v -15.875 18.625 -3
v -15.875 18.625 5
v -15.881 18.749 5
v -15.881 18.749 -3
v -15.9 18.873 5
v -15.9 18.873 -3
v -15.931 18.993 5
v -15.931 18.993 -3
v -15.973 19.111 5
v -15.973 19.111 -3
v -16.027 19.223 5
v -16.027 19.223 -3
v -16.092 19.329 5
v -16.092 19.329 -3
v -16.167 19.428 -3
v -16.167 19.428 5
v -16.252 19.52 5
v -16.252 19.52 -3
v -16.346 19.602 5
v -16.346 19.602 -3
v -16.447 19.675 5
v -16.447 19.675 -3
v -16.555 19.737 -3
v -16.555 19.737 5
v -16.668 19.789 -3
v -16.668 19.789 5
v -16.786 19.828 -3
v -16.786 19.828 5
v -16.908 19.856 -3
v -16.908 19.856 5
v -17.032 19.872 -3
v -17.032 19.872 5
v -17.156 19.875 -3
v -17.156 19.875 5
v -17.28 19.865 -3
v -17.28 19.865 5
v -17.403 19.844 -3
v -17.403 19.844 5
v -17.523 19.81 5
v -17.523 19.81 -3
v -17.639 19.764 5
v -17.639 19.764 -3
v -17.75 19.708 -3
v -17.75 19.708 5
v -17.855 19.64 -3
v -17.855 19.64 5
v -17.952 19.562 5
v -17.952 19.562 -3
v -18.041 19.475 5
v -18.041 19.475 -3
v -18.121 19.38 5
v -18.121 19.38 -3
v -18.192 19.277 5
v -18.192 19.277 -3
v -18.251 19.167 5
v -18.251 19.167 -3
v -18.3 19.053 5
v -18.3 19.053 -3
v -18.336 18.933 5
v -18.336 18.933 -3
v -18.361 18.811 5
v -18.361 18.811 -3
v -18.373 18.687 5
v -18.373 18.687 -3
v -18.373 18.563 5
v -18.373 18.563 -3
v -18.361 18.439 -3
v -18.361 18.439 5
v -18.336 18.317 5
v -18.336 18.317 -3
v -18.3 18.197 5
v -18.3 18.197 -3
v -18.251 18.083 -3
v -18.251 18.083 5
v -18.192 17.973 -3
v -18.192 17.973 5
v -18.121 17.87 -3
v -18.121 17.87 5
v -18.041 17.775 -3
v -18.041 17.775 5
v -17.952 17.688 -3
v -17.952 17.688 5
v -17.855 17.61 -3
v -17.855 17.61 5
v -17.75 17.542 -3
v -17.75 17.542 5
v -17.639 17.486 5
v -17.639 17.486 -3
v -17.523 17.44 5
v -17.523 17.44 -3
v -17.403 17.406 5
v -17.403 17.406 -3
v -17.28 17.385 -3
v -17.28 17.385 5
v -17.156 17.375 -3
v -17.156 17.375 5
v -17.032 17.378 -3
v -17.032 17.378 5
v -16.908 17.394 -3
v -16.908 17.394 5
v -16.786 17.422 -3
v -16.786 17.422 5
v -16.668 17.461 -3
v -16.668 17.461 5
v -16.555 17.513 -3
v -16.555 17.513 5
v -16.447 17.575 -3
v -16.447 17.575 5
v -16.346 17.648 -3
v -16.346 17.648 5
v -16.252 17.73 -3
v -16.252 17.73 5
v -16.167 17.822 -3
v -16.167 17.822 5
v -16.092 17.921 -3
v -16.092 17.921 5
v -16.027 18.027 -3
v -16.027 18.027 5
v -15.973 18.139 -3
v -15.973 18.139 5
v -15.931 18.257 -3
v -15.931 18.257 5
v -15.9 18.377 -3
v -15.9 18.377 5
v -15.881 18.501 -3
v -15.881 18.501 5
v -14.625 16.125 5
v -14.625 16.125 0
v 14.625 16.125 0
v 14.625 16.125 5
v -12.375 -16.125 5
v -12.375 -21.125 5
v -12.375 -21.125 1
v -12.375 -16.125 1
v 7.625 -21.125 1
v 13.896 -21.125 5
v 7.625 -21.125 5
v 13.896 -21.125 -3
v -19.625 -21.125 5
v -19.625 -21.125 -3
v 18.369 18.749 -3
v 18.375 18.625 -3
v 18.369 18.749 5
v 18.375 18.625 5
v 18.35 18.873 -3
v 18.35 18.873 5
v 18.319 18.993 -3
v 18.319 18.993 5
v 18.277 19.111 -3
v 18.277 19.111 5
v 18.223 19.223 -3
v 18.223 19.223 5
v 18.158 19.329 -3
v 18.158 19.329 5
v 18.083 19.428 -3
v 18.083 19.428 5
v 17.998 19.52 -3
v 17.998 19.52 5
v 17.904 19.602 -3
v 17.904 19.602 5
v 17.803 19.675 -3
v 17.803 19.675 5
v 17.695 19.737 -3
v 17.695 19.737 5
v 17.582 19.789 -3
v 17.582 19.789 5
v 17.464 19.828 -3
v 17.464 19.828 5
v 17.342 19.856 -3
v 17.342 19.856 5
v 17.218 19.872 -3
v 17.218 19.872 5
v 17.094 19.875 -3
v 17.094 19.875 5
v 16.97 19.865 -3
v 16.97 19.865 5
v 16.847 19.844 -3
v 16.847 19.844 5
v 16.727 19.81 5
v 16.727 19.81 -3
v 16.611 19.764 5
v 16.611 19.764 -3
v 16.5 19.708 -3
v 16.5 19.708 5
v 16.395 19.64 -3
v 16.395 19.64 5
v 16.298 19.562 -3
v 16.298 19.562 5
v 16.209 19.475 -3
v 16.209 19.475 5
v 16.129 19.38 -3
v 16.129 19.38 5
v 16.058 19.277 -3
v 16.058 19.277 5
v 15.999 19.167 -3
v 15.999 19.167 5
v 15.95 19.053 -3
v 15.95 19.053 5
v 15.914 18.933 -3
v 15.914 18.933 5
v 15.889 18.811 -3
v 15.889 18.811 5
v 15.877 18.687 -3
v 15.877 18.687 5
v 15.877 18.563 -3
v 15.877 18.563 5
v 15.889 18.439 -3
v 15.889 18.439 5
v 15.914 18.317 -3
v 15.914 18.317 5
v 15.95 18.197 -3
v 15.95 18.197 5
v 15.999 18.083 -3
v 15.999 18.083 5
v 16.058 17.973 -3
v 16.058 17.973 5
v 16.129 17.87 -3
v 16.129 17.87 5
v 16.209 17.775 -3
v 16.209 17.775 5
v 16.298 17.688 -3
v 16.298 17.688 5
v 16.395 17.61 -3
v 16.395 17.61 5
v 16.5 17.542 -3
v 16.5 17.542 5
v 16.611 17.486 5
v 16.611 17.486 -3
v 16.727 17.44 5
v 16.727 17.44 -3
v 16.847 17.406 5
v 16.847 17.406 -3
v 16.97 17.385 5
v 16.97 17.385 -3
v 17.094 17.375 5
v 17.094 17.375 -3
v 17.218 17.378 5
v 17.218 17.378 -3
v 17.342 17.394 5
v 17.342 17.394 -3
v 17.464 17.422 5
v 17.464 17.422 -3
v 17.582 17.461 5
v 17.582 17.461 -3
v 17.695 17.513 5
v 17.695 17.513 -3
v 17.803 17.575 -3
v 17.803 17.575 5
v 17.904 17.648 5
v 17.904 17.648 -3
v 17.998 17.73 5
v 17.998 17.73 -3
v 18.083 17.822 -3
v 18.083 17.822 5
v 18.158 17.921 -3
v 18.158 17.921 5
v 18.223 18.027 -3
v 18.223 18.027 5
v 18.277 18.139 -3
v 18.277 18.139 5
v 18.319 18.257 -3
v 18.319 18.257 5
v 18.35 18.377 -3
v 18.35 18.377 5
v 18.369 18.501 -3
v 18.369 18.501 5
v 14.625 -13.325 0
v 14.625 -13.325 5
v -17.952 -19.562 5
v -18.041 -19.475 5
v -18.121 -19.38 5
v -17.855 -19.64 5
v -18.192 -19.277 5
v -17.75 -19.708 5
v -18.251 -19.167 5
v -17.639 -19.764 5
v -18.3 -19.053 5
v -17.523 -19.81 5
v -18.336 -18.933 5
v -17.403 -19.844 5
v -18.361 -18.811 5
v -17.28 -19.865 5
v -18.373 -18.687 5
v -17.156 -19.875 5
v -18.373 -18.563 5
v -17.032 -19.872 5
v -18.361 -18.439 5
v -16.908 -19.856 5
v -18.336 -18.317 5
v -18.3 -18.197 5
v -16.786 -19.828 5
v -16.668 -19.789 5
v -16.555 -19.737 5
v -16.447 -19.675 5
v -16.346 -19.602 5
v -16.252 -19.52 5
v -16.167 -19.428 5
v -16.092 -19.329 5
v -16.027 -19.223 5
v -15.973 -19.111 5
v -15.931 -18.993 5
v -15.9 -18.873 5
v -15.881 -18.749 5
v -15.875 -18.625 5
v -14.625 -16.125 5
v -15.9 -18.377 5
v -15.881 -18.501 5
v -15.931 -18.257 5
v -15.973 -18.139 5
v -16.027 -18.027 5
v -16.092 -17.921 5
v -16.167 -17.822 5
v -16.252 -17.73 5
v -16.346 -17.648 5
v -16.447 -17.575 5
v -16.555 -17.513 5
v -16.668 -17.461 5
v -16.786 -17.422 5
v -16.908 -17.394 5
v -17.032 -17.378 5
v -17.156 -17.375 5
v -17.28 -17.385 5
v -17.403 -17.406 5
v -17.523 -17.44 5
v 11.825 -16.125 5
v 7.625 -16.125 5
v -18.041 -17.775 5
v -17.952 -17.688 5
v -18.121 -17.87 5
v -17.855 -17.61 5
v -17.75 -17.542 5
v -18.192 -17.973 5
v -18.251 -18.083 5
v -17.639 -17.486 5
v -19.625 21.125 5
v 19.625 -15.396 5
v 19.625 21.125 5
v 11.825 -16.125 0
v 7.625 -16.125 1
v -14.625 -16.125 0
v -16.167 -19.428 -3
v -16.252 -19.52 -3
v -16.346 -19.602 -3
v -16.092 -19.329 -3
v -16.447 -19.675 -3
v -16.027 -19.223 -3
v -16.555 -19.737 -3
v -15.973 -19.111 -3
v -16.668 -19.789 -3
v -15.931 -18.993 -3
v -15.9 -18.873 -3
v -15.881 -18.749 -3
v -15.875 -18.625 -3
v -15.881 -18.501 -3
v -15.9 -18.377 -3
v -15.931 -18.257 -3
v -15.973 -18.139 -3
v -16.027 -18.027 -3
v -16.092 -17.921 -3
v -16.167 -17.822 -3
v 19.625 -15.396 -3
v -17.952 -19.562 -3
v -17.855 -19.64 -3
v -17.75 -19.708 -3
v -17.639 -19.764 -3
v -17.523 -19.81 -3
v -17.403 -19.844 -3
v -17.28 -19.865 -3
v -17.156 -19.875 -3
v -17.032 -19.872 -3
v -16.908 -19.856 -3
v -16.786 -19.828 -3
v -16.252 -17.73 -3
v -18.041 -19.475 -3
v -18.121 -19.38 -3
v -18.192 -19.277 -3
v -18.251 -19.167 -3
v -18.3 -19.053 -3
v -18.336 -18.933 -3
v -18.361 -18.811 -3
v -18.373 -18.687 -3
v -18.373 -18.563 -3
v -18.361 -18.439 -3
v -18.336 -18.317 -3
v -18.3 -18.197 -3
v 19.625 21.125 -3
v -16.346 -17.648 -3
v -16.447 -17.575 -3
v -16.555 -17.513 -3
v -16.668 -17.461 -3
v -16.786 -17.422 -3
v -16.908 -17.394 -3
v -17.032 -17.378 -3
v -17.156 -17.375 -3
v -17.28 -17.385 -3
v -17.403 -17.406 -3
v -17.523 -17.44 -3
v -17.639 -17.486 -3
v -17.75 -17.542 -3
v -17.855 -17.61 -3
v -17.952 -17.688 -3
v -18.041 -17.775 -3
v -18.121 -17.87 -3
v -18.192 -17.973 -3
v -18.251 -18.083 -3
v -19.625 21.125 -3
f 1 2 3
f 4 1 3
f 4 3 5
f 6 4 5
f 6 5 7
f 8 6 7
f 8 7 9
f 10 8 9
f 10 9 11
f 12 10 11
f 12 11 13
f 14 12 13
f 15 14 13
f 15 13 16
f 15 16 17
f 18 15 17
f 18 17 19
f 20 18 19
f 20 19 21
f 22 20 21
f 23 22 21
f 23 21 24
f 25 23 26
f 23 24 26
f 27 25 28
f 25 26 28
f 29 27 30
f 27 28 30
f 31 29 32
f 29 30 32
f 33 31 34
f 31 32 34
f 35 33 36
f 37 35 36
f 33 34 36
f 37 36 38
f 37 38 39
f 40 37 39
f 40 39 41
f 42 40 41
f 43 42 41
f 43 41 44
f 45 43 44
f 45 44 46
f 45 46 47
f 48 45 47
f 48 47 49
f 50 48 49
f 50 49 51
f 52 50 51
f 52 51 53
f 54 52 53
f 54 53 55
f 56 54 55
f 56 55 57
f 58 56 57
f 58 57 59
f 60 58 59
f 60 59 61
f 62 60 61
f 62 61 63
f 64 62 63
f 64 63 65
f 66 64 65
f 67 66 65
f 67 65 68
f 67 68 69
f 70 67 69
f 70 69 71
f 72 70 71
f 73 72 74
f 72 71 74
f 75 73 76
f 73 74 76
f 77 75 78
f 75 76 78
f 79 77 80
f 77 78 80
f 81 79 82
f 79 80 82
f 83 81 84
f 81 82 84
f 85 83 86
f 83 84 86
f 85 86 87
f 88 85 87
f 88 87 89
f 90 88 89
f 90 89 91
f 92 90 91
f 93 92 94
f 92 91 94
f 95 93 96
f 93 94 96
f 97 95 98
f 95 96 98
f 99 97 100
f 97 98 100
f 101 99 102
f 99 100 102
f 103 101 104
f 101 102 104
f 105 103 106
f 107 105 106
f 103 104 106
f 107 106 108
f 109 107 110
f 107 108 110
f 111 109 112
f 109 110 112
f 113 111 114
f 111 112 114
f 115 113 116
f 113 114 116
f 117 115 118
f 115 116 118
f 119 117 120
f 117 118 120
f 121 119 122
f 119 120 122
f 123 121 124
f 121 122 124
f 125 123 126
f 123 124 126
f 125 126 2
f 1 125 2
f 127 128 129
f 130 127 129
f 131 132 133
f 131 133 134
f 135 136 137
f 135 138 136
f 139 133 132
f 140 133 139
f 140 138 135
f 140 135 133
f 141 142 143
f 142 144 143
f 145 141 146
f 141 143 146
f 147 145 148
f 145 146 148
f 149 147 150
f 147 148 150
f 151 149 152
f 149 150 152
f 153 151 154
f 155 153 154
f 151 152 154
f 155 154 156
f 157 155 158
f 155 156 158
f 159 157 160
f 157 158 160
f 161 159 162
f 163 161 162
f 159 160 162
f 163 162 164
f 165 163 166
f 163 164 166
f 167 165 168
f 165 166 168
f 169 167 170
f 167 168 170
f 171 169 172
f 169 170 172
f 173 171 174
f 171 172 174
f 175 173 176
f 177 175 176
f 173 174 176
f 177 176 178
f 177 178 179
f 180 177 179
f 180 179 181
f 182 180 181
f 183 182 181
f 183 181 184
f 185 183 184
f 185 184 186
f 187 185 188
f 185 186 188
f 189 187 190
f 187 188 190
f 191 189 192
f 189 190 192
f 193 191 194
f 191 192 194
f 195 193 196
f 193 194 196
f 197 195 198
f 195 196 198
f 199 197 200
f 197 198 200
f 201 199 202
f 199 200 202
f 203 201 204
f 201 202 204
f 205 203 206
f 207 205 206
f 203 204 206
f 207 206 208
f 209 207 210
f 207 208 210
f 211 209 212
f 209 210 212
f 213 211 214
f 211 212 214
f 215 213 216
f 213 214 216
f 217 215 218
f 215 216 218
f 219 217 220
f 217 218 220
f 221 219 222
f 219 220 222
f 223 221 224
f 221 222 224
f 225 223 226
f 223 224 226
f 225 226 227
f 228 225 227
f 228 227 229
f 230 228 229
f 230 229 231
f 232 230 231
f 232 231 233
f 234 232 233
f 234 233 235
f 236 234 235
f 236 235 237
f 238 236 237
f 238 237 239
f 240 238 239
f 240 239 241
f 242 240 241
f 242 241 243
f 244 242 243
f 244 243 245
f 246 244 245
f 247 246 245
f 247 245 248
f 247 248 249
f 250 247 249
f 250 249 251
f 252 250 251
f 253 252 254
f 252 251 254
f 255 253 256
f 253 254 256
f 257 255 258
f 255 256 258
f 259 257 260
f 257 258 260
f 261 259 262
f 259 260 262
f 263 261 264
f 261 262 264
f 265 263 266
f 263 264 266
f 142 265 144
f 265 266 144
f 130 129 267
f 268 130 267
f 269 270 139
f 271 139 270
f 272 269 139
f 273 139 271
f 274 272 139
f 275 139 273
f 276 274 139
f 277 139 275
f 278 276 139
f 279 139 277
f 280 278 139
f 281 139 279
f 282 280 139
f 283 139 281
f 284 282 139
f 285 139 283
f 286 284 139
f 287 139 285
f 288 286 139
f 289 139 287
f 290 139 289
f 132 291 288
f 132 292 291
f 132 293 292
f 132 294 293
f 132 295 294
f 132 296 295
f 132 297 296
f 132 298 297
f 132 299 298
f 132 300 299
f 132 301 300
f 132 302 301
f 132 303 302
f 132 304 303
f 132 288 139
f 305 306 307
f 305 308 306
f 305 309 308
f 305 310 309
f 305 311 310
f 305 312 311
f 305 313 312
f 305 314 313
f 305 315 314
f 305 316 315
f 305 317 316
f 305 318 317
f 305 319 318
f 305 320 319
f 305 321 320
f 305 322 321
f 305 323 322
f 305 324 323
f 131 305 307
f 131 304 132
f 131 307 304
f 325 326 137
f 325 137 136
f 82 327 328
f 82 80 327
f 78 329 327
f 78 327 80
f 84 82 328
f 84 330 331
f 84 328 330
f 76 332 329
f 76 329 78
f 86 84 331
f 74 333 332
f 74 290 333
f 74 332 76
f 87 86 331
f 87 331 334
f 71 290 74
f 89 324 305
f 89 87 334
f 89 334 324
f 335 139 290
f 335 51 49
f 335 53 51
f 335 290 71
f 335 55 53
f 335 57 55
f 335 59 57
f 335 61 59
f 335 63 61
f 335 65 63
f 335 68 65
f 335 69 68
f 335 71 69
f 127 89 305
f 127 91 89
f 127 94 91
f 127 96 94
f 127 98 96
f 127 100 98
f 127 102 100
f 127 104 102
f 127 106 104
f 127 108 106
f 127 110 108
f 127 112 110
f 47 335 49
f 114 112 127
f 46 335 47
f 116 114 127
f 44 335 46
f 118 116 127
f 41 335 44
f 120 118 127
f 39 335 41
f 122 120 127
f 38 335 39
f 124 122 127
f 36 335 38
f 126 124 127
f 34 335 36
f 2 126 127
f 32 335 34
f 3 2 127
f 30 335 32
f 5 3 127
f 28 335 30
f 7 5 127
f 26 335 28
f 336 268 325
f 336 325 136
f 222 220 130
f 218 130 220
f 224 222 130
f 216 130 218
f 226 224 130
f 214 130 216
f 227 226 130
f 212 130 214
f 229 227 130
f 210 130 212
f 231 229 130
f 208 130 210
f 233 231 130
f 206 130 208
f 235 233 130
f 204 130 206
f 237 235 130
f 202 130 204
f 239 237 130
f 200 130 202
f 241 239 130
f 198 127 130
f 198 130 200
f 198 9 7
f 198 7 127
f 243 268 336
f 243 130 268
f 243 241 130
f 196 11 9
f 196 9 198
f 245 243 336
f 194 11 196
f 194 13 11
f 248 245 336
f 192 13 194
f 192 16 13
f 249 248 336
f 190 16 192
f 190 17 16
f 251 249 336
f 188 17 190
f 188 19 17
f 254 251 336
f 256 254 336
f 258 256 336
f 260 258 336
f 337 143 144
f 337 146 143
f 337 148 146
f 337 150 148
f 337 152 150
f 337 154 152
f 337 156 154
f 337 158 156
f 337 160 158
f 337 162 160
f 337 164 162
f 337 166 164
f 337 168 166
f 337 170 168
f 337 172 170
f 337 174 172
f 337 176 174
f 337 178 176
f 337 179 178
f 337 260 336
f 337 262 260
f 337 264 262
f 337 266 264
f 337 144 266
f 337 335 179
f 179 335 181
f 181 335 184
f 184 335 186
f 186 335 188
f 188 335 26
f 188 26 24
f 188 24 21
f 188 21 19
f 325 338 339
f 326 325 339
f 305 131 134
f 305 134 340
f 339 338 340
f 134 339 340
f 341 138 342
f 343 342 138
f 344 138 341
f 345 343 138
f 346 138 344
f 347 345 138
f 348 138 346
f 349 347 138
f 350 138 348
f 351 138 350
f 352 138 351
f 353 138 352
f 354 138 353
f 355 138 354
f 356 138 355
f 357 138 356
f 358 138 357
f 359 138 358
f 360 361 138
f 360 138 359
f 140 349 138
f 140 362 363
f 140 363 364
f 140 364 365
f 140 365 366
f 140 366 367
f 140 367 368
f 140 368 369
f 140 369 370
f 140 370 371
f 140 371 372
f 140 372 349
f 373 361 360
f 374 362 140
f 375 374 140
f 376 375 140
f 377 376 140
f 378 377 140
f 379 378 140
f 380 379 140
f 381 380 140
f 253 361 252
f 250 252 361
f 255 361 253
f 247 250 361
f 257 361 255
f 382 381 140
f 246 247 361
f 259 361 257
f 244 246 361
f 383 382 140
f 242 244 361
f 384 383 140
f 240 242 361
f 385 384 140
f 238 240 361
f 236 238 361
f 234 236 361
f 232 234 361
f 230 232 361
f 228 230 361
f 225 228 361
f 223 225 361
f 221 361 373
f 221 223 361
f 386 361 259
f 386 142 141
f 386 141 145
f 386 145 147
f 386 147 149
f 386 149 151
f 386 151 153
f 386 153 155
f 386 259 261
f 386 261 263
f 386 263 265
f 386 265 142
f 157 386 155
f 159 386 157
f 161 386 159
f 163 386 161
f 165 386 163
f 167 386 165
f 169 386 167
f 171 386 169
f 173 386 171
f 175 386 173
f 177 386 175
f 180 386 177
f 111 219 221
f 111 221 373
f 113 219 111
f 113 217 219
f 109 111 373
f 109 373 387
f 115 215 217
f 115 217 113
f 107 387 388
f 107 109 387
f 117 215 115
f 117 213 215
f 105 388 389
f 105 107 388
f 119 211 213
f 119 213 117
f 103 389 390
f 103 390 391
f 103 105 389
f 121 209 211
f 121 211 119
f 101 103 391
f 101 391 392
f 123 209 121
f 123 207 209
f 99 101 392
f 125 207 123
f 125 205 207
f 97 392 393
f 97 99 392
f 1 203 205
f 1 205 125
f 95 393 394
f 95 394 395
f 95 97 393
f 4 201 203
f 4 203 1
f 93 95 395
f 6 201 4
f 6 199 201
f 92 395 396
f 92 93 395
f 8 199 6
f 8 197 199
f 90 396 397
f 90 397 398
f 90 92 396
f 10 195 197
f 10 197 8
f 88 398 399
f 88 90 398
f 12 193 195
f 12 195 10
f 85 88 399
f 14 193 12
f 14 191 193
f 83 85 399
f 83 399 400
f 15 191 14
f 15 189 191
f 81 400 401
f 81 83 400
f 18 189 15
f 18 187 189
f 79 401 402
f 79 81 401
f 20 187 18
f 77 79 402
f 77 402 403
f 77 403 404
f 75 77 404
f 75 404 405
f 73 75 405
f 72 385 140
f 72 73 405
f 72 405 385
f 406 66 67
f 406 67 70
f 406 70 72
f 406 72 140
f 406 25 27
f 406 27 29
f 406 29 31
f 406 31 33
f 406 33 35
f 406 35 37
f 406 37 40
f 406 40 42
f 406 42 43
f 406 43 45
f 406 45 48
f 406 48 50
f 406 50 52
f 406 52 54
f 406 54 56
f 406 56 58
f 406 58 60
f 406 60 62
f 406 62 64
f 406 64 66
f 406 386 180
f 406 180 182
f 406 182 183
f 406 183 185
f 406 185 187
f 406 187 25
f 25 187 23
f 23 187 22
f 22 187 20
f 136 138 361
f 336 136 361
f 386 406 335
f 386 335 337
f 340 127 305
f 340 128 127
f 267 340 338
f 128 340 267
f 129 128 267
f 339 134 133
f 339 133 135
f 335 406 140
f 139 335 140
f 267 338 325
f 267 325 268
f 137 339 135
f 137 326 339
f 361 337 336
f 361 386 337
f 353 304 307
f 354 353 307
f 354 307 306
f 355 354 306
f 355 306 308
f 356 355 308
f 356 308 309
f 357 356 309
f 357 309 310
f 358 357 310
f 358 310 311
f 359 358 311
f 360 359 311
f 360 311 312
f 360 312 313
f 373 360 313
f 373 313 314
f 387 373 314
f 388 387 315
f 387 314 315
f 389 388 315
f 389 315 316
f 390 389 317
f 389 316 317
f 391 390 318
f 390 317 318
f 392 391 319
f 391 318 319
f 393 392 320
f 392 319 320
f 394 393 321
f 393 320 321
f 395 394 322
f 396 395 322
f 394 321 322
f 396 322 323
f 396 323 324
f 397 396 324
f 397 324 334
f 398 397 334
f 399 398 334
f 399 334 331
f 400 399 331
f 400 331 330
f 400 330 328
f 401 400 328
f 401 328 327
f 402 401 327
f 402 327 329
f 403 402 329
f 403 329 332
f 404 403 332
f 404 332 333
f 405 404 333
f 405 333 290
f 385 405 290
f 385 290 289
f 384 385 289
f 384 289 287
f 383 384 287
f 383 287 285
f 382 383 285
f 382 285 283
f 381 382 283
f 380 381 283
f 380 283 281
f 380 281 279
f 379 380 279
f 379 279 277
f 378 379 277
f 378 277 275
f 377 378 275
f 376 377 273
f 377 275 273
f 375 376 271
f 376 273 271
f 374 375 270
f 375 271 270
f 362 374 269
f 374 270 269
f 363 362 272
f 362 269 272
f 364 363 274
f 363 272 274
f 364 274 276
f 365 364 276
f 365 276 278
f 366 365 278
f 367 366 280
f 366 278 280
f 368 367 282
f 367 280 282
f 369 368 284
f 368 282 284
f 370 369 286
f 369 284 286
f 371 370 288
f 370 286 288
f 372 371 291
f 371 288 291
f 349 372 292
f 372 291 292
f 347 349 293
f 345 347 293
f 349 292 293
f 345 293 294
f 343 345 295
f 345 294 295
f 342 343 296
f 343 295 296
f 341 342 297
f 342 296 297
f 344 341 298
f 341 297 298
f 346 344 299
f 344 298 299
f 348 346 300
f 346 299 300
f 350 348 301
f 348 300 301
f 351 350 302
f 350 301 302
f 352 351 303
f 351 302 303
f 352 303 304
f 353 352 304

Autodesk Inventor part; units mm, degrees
ref_plane "YZ Plane" through (0, 0, 0) normal (1, 0, 0) x (0, 1, 0)
ref_plane "XZ Plane" through (0, 0, 0) normal (0, 1, 0) x (-1, 0, 0)
ref_plane "XY Plane" through (0, 0, 0) normal (0, 0, 1) x (1, 0, 0)
sketch "Sketch1" plane through (0, 0, 0) normal (0, 0, 1) x (1, 0, 0)
  line L0 (11.825, -16.125) -> (-11.825, -16.125)
  line L1 (-14.625, -13.325) -> (-14.625, 16.125)
  line L2 (-14.625, 16.125) -> (14.625, 16.125)
  line L3 (14.625, 16.125) -> (14.625, -13.325)
  line L4 (14.625, -16.125) -> (-14.625, 16.125) construction
  line L5 (-14.625, -16.125) -> (14.625, 16.125) construction
  line L6 (11.825, -16.125) -> (14.625, -13.325)
  line L7 (-14.625, -13.325) -> (-14.625, -16.125)
  line L8 (-14.625, -16.125) -> (-11.825, -16.125)
  point P0 (0, 0)
  dimension "d0" = 29.25
  dimension "d1" = 32.25
  dimension "d24" = 2.8
  dimension "d25" = 2.8
extrude "Extrusion1" add sketch "Sketch1" along normal blind 5
shell "Shell2" thickness 5 outward yes removed faces 1 at (-4.875, -3.5083, 5)
sketch "Sketch3" plane through (0, 0, 5) normal (0, 0, 1) x (1, 0, 0)
  line L0 (19.625, 21.125) -> (-19.625, 21.125) construction
  line L1 (-14.625, 16.125) -> (14.625, 16.125) construction
  line L2 (-19.625, 21.125) -> (-14.625, 16.125) construction
  line L3 (19.625, -15.3961) -> (19.625, 21.125) construction
  line L4 (14.625, 16.125) -> (19.625, 21.125) construction
  line L5 (11.825, -16.125) -> (-14.625, -16.125) construction
  circle A0 centre (-17.125, 18.625) radius 1.25
  circle A1 centre (17.125, 18.625) radius 1.25
  line L6 (-14.625, -16.125) -> (11.825, -16.125) construction
  line L7 (-19.625, 21.125) -> (-19.625, -21.125) construction
  line L8 (-14.625, -16.125) -> (-19.625, -21.125) construction
  circle A2 centre (-17.125, -18.625) radius 1.25
  point P0 (0, 0)
  point P1 (-11.825, -16.125)
  dimension "d14" = 2.5
  dimension "d15" = 2.5
  dimension "d26" = 2.5
extrude "Extrusion3" cut sketch "Sketch3" against normal through all
sketch "Sketch4" plane through (0, 0, 5) normal (0, 0, 1) x (1, 0, 0)
  line L0 (-19.625, -21.125) -> (13.8961, -21.125) projected
  line L1 (11.825, -16.125) -> (-14.625, -16.125) projected
  line L2 (7.625, -21.125) -> (-12.375, -21.125)
  line L3 (-12.375, -21.125) -> (-12.375, -16.125)
  line L4 (-12.375, -16.125) -> (7.625, -16.125)
  line L5 (7.625, -16.125) -> (7.625, -21.125)
  line L6 (-19.625, 21.125) -> (-19.625, -21.125) projected
  point P0 (0, 0)
  point P1 (-13.4819, -20.125)
  point P2 (14.625, -16.125)
  point P3 (-11.825, -16.125)
  point P4 (7.625, -16.125)
  point P5 (13.8961, -21.125)
  dimension "d19" = 20
  dimension "d20" = 5
  dimension "d29" = 7.25
extrude "Extrusion4" cut sketch "Sketch4" against normal blind 4
sketch "Sketch5" plane through (0, 0, -5) normal (0, 0, -1) x (-1, 0, 0)
  line L0 (-19.625, 21.125) -> (19.625, 21.125) projected
  line L1 (19.625, -21.125) -> (-13.8961, -21.125) projected
  line L2 (-19.625, 21.125) -> (19.625, 21.125)
  line L3 (19.625, 21.125) -> (19.625, -21.125)
  line L4 (19.625, -21.125) -> (-19.625, -21.125)
  line L5 (-19.625, -21.125) -> (-19.625, 21.125)
  point P0 (0, 0)
  point P1 (19.625, 21.125)
extrude "Extrusion5" cut sketch "Sketch5" against normal blind 2
equation "\"d25\" = d24"
equation "\"d26\" = d14"
properties part number "SpeakerHolder"
